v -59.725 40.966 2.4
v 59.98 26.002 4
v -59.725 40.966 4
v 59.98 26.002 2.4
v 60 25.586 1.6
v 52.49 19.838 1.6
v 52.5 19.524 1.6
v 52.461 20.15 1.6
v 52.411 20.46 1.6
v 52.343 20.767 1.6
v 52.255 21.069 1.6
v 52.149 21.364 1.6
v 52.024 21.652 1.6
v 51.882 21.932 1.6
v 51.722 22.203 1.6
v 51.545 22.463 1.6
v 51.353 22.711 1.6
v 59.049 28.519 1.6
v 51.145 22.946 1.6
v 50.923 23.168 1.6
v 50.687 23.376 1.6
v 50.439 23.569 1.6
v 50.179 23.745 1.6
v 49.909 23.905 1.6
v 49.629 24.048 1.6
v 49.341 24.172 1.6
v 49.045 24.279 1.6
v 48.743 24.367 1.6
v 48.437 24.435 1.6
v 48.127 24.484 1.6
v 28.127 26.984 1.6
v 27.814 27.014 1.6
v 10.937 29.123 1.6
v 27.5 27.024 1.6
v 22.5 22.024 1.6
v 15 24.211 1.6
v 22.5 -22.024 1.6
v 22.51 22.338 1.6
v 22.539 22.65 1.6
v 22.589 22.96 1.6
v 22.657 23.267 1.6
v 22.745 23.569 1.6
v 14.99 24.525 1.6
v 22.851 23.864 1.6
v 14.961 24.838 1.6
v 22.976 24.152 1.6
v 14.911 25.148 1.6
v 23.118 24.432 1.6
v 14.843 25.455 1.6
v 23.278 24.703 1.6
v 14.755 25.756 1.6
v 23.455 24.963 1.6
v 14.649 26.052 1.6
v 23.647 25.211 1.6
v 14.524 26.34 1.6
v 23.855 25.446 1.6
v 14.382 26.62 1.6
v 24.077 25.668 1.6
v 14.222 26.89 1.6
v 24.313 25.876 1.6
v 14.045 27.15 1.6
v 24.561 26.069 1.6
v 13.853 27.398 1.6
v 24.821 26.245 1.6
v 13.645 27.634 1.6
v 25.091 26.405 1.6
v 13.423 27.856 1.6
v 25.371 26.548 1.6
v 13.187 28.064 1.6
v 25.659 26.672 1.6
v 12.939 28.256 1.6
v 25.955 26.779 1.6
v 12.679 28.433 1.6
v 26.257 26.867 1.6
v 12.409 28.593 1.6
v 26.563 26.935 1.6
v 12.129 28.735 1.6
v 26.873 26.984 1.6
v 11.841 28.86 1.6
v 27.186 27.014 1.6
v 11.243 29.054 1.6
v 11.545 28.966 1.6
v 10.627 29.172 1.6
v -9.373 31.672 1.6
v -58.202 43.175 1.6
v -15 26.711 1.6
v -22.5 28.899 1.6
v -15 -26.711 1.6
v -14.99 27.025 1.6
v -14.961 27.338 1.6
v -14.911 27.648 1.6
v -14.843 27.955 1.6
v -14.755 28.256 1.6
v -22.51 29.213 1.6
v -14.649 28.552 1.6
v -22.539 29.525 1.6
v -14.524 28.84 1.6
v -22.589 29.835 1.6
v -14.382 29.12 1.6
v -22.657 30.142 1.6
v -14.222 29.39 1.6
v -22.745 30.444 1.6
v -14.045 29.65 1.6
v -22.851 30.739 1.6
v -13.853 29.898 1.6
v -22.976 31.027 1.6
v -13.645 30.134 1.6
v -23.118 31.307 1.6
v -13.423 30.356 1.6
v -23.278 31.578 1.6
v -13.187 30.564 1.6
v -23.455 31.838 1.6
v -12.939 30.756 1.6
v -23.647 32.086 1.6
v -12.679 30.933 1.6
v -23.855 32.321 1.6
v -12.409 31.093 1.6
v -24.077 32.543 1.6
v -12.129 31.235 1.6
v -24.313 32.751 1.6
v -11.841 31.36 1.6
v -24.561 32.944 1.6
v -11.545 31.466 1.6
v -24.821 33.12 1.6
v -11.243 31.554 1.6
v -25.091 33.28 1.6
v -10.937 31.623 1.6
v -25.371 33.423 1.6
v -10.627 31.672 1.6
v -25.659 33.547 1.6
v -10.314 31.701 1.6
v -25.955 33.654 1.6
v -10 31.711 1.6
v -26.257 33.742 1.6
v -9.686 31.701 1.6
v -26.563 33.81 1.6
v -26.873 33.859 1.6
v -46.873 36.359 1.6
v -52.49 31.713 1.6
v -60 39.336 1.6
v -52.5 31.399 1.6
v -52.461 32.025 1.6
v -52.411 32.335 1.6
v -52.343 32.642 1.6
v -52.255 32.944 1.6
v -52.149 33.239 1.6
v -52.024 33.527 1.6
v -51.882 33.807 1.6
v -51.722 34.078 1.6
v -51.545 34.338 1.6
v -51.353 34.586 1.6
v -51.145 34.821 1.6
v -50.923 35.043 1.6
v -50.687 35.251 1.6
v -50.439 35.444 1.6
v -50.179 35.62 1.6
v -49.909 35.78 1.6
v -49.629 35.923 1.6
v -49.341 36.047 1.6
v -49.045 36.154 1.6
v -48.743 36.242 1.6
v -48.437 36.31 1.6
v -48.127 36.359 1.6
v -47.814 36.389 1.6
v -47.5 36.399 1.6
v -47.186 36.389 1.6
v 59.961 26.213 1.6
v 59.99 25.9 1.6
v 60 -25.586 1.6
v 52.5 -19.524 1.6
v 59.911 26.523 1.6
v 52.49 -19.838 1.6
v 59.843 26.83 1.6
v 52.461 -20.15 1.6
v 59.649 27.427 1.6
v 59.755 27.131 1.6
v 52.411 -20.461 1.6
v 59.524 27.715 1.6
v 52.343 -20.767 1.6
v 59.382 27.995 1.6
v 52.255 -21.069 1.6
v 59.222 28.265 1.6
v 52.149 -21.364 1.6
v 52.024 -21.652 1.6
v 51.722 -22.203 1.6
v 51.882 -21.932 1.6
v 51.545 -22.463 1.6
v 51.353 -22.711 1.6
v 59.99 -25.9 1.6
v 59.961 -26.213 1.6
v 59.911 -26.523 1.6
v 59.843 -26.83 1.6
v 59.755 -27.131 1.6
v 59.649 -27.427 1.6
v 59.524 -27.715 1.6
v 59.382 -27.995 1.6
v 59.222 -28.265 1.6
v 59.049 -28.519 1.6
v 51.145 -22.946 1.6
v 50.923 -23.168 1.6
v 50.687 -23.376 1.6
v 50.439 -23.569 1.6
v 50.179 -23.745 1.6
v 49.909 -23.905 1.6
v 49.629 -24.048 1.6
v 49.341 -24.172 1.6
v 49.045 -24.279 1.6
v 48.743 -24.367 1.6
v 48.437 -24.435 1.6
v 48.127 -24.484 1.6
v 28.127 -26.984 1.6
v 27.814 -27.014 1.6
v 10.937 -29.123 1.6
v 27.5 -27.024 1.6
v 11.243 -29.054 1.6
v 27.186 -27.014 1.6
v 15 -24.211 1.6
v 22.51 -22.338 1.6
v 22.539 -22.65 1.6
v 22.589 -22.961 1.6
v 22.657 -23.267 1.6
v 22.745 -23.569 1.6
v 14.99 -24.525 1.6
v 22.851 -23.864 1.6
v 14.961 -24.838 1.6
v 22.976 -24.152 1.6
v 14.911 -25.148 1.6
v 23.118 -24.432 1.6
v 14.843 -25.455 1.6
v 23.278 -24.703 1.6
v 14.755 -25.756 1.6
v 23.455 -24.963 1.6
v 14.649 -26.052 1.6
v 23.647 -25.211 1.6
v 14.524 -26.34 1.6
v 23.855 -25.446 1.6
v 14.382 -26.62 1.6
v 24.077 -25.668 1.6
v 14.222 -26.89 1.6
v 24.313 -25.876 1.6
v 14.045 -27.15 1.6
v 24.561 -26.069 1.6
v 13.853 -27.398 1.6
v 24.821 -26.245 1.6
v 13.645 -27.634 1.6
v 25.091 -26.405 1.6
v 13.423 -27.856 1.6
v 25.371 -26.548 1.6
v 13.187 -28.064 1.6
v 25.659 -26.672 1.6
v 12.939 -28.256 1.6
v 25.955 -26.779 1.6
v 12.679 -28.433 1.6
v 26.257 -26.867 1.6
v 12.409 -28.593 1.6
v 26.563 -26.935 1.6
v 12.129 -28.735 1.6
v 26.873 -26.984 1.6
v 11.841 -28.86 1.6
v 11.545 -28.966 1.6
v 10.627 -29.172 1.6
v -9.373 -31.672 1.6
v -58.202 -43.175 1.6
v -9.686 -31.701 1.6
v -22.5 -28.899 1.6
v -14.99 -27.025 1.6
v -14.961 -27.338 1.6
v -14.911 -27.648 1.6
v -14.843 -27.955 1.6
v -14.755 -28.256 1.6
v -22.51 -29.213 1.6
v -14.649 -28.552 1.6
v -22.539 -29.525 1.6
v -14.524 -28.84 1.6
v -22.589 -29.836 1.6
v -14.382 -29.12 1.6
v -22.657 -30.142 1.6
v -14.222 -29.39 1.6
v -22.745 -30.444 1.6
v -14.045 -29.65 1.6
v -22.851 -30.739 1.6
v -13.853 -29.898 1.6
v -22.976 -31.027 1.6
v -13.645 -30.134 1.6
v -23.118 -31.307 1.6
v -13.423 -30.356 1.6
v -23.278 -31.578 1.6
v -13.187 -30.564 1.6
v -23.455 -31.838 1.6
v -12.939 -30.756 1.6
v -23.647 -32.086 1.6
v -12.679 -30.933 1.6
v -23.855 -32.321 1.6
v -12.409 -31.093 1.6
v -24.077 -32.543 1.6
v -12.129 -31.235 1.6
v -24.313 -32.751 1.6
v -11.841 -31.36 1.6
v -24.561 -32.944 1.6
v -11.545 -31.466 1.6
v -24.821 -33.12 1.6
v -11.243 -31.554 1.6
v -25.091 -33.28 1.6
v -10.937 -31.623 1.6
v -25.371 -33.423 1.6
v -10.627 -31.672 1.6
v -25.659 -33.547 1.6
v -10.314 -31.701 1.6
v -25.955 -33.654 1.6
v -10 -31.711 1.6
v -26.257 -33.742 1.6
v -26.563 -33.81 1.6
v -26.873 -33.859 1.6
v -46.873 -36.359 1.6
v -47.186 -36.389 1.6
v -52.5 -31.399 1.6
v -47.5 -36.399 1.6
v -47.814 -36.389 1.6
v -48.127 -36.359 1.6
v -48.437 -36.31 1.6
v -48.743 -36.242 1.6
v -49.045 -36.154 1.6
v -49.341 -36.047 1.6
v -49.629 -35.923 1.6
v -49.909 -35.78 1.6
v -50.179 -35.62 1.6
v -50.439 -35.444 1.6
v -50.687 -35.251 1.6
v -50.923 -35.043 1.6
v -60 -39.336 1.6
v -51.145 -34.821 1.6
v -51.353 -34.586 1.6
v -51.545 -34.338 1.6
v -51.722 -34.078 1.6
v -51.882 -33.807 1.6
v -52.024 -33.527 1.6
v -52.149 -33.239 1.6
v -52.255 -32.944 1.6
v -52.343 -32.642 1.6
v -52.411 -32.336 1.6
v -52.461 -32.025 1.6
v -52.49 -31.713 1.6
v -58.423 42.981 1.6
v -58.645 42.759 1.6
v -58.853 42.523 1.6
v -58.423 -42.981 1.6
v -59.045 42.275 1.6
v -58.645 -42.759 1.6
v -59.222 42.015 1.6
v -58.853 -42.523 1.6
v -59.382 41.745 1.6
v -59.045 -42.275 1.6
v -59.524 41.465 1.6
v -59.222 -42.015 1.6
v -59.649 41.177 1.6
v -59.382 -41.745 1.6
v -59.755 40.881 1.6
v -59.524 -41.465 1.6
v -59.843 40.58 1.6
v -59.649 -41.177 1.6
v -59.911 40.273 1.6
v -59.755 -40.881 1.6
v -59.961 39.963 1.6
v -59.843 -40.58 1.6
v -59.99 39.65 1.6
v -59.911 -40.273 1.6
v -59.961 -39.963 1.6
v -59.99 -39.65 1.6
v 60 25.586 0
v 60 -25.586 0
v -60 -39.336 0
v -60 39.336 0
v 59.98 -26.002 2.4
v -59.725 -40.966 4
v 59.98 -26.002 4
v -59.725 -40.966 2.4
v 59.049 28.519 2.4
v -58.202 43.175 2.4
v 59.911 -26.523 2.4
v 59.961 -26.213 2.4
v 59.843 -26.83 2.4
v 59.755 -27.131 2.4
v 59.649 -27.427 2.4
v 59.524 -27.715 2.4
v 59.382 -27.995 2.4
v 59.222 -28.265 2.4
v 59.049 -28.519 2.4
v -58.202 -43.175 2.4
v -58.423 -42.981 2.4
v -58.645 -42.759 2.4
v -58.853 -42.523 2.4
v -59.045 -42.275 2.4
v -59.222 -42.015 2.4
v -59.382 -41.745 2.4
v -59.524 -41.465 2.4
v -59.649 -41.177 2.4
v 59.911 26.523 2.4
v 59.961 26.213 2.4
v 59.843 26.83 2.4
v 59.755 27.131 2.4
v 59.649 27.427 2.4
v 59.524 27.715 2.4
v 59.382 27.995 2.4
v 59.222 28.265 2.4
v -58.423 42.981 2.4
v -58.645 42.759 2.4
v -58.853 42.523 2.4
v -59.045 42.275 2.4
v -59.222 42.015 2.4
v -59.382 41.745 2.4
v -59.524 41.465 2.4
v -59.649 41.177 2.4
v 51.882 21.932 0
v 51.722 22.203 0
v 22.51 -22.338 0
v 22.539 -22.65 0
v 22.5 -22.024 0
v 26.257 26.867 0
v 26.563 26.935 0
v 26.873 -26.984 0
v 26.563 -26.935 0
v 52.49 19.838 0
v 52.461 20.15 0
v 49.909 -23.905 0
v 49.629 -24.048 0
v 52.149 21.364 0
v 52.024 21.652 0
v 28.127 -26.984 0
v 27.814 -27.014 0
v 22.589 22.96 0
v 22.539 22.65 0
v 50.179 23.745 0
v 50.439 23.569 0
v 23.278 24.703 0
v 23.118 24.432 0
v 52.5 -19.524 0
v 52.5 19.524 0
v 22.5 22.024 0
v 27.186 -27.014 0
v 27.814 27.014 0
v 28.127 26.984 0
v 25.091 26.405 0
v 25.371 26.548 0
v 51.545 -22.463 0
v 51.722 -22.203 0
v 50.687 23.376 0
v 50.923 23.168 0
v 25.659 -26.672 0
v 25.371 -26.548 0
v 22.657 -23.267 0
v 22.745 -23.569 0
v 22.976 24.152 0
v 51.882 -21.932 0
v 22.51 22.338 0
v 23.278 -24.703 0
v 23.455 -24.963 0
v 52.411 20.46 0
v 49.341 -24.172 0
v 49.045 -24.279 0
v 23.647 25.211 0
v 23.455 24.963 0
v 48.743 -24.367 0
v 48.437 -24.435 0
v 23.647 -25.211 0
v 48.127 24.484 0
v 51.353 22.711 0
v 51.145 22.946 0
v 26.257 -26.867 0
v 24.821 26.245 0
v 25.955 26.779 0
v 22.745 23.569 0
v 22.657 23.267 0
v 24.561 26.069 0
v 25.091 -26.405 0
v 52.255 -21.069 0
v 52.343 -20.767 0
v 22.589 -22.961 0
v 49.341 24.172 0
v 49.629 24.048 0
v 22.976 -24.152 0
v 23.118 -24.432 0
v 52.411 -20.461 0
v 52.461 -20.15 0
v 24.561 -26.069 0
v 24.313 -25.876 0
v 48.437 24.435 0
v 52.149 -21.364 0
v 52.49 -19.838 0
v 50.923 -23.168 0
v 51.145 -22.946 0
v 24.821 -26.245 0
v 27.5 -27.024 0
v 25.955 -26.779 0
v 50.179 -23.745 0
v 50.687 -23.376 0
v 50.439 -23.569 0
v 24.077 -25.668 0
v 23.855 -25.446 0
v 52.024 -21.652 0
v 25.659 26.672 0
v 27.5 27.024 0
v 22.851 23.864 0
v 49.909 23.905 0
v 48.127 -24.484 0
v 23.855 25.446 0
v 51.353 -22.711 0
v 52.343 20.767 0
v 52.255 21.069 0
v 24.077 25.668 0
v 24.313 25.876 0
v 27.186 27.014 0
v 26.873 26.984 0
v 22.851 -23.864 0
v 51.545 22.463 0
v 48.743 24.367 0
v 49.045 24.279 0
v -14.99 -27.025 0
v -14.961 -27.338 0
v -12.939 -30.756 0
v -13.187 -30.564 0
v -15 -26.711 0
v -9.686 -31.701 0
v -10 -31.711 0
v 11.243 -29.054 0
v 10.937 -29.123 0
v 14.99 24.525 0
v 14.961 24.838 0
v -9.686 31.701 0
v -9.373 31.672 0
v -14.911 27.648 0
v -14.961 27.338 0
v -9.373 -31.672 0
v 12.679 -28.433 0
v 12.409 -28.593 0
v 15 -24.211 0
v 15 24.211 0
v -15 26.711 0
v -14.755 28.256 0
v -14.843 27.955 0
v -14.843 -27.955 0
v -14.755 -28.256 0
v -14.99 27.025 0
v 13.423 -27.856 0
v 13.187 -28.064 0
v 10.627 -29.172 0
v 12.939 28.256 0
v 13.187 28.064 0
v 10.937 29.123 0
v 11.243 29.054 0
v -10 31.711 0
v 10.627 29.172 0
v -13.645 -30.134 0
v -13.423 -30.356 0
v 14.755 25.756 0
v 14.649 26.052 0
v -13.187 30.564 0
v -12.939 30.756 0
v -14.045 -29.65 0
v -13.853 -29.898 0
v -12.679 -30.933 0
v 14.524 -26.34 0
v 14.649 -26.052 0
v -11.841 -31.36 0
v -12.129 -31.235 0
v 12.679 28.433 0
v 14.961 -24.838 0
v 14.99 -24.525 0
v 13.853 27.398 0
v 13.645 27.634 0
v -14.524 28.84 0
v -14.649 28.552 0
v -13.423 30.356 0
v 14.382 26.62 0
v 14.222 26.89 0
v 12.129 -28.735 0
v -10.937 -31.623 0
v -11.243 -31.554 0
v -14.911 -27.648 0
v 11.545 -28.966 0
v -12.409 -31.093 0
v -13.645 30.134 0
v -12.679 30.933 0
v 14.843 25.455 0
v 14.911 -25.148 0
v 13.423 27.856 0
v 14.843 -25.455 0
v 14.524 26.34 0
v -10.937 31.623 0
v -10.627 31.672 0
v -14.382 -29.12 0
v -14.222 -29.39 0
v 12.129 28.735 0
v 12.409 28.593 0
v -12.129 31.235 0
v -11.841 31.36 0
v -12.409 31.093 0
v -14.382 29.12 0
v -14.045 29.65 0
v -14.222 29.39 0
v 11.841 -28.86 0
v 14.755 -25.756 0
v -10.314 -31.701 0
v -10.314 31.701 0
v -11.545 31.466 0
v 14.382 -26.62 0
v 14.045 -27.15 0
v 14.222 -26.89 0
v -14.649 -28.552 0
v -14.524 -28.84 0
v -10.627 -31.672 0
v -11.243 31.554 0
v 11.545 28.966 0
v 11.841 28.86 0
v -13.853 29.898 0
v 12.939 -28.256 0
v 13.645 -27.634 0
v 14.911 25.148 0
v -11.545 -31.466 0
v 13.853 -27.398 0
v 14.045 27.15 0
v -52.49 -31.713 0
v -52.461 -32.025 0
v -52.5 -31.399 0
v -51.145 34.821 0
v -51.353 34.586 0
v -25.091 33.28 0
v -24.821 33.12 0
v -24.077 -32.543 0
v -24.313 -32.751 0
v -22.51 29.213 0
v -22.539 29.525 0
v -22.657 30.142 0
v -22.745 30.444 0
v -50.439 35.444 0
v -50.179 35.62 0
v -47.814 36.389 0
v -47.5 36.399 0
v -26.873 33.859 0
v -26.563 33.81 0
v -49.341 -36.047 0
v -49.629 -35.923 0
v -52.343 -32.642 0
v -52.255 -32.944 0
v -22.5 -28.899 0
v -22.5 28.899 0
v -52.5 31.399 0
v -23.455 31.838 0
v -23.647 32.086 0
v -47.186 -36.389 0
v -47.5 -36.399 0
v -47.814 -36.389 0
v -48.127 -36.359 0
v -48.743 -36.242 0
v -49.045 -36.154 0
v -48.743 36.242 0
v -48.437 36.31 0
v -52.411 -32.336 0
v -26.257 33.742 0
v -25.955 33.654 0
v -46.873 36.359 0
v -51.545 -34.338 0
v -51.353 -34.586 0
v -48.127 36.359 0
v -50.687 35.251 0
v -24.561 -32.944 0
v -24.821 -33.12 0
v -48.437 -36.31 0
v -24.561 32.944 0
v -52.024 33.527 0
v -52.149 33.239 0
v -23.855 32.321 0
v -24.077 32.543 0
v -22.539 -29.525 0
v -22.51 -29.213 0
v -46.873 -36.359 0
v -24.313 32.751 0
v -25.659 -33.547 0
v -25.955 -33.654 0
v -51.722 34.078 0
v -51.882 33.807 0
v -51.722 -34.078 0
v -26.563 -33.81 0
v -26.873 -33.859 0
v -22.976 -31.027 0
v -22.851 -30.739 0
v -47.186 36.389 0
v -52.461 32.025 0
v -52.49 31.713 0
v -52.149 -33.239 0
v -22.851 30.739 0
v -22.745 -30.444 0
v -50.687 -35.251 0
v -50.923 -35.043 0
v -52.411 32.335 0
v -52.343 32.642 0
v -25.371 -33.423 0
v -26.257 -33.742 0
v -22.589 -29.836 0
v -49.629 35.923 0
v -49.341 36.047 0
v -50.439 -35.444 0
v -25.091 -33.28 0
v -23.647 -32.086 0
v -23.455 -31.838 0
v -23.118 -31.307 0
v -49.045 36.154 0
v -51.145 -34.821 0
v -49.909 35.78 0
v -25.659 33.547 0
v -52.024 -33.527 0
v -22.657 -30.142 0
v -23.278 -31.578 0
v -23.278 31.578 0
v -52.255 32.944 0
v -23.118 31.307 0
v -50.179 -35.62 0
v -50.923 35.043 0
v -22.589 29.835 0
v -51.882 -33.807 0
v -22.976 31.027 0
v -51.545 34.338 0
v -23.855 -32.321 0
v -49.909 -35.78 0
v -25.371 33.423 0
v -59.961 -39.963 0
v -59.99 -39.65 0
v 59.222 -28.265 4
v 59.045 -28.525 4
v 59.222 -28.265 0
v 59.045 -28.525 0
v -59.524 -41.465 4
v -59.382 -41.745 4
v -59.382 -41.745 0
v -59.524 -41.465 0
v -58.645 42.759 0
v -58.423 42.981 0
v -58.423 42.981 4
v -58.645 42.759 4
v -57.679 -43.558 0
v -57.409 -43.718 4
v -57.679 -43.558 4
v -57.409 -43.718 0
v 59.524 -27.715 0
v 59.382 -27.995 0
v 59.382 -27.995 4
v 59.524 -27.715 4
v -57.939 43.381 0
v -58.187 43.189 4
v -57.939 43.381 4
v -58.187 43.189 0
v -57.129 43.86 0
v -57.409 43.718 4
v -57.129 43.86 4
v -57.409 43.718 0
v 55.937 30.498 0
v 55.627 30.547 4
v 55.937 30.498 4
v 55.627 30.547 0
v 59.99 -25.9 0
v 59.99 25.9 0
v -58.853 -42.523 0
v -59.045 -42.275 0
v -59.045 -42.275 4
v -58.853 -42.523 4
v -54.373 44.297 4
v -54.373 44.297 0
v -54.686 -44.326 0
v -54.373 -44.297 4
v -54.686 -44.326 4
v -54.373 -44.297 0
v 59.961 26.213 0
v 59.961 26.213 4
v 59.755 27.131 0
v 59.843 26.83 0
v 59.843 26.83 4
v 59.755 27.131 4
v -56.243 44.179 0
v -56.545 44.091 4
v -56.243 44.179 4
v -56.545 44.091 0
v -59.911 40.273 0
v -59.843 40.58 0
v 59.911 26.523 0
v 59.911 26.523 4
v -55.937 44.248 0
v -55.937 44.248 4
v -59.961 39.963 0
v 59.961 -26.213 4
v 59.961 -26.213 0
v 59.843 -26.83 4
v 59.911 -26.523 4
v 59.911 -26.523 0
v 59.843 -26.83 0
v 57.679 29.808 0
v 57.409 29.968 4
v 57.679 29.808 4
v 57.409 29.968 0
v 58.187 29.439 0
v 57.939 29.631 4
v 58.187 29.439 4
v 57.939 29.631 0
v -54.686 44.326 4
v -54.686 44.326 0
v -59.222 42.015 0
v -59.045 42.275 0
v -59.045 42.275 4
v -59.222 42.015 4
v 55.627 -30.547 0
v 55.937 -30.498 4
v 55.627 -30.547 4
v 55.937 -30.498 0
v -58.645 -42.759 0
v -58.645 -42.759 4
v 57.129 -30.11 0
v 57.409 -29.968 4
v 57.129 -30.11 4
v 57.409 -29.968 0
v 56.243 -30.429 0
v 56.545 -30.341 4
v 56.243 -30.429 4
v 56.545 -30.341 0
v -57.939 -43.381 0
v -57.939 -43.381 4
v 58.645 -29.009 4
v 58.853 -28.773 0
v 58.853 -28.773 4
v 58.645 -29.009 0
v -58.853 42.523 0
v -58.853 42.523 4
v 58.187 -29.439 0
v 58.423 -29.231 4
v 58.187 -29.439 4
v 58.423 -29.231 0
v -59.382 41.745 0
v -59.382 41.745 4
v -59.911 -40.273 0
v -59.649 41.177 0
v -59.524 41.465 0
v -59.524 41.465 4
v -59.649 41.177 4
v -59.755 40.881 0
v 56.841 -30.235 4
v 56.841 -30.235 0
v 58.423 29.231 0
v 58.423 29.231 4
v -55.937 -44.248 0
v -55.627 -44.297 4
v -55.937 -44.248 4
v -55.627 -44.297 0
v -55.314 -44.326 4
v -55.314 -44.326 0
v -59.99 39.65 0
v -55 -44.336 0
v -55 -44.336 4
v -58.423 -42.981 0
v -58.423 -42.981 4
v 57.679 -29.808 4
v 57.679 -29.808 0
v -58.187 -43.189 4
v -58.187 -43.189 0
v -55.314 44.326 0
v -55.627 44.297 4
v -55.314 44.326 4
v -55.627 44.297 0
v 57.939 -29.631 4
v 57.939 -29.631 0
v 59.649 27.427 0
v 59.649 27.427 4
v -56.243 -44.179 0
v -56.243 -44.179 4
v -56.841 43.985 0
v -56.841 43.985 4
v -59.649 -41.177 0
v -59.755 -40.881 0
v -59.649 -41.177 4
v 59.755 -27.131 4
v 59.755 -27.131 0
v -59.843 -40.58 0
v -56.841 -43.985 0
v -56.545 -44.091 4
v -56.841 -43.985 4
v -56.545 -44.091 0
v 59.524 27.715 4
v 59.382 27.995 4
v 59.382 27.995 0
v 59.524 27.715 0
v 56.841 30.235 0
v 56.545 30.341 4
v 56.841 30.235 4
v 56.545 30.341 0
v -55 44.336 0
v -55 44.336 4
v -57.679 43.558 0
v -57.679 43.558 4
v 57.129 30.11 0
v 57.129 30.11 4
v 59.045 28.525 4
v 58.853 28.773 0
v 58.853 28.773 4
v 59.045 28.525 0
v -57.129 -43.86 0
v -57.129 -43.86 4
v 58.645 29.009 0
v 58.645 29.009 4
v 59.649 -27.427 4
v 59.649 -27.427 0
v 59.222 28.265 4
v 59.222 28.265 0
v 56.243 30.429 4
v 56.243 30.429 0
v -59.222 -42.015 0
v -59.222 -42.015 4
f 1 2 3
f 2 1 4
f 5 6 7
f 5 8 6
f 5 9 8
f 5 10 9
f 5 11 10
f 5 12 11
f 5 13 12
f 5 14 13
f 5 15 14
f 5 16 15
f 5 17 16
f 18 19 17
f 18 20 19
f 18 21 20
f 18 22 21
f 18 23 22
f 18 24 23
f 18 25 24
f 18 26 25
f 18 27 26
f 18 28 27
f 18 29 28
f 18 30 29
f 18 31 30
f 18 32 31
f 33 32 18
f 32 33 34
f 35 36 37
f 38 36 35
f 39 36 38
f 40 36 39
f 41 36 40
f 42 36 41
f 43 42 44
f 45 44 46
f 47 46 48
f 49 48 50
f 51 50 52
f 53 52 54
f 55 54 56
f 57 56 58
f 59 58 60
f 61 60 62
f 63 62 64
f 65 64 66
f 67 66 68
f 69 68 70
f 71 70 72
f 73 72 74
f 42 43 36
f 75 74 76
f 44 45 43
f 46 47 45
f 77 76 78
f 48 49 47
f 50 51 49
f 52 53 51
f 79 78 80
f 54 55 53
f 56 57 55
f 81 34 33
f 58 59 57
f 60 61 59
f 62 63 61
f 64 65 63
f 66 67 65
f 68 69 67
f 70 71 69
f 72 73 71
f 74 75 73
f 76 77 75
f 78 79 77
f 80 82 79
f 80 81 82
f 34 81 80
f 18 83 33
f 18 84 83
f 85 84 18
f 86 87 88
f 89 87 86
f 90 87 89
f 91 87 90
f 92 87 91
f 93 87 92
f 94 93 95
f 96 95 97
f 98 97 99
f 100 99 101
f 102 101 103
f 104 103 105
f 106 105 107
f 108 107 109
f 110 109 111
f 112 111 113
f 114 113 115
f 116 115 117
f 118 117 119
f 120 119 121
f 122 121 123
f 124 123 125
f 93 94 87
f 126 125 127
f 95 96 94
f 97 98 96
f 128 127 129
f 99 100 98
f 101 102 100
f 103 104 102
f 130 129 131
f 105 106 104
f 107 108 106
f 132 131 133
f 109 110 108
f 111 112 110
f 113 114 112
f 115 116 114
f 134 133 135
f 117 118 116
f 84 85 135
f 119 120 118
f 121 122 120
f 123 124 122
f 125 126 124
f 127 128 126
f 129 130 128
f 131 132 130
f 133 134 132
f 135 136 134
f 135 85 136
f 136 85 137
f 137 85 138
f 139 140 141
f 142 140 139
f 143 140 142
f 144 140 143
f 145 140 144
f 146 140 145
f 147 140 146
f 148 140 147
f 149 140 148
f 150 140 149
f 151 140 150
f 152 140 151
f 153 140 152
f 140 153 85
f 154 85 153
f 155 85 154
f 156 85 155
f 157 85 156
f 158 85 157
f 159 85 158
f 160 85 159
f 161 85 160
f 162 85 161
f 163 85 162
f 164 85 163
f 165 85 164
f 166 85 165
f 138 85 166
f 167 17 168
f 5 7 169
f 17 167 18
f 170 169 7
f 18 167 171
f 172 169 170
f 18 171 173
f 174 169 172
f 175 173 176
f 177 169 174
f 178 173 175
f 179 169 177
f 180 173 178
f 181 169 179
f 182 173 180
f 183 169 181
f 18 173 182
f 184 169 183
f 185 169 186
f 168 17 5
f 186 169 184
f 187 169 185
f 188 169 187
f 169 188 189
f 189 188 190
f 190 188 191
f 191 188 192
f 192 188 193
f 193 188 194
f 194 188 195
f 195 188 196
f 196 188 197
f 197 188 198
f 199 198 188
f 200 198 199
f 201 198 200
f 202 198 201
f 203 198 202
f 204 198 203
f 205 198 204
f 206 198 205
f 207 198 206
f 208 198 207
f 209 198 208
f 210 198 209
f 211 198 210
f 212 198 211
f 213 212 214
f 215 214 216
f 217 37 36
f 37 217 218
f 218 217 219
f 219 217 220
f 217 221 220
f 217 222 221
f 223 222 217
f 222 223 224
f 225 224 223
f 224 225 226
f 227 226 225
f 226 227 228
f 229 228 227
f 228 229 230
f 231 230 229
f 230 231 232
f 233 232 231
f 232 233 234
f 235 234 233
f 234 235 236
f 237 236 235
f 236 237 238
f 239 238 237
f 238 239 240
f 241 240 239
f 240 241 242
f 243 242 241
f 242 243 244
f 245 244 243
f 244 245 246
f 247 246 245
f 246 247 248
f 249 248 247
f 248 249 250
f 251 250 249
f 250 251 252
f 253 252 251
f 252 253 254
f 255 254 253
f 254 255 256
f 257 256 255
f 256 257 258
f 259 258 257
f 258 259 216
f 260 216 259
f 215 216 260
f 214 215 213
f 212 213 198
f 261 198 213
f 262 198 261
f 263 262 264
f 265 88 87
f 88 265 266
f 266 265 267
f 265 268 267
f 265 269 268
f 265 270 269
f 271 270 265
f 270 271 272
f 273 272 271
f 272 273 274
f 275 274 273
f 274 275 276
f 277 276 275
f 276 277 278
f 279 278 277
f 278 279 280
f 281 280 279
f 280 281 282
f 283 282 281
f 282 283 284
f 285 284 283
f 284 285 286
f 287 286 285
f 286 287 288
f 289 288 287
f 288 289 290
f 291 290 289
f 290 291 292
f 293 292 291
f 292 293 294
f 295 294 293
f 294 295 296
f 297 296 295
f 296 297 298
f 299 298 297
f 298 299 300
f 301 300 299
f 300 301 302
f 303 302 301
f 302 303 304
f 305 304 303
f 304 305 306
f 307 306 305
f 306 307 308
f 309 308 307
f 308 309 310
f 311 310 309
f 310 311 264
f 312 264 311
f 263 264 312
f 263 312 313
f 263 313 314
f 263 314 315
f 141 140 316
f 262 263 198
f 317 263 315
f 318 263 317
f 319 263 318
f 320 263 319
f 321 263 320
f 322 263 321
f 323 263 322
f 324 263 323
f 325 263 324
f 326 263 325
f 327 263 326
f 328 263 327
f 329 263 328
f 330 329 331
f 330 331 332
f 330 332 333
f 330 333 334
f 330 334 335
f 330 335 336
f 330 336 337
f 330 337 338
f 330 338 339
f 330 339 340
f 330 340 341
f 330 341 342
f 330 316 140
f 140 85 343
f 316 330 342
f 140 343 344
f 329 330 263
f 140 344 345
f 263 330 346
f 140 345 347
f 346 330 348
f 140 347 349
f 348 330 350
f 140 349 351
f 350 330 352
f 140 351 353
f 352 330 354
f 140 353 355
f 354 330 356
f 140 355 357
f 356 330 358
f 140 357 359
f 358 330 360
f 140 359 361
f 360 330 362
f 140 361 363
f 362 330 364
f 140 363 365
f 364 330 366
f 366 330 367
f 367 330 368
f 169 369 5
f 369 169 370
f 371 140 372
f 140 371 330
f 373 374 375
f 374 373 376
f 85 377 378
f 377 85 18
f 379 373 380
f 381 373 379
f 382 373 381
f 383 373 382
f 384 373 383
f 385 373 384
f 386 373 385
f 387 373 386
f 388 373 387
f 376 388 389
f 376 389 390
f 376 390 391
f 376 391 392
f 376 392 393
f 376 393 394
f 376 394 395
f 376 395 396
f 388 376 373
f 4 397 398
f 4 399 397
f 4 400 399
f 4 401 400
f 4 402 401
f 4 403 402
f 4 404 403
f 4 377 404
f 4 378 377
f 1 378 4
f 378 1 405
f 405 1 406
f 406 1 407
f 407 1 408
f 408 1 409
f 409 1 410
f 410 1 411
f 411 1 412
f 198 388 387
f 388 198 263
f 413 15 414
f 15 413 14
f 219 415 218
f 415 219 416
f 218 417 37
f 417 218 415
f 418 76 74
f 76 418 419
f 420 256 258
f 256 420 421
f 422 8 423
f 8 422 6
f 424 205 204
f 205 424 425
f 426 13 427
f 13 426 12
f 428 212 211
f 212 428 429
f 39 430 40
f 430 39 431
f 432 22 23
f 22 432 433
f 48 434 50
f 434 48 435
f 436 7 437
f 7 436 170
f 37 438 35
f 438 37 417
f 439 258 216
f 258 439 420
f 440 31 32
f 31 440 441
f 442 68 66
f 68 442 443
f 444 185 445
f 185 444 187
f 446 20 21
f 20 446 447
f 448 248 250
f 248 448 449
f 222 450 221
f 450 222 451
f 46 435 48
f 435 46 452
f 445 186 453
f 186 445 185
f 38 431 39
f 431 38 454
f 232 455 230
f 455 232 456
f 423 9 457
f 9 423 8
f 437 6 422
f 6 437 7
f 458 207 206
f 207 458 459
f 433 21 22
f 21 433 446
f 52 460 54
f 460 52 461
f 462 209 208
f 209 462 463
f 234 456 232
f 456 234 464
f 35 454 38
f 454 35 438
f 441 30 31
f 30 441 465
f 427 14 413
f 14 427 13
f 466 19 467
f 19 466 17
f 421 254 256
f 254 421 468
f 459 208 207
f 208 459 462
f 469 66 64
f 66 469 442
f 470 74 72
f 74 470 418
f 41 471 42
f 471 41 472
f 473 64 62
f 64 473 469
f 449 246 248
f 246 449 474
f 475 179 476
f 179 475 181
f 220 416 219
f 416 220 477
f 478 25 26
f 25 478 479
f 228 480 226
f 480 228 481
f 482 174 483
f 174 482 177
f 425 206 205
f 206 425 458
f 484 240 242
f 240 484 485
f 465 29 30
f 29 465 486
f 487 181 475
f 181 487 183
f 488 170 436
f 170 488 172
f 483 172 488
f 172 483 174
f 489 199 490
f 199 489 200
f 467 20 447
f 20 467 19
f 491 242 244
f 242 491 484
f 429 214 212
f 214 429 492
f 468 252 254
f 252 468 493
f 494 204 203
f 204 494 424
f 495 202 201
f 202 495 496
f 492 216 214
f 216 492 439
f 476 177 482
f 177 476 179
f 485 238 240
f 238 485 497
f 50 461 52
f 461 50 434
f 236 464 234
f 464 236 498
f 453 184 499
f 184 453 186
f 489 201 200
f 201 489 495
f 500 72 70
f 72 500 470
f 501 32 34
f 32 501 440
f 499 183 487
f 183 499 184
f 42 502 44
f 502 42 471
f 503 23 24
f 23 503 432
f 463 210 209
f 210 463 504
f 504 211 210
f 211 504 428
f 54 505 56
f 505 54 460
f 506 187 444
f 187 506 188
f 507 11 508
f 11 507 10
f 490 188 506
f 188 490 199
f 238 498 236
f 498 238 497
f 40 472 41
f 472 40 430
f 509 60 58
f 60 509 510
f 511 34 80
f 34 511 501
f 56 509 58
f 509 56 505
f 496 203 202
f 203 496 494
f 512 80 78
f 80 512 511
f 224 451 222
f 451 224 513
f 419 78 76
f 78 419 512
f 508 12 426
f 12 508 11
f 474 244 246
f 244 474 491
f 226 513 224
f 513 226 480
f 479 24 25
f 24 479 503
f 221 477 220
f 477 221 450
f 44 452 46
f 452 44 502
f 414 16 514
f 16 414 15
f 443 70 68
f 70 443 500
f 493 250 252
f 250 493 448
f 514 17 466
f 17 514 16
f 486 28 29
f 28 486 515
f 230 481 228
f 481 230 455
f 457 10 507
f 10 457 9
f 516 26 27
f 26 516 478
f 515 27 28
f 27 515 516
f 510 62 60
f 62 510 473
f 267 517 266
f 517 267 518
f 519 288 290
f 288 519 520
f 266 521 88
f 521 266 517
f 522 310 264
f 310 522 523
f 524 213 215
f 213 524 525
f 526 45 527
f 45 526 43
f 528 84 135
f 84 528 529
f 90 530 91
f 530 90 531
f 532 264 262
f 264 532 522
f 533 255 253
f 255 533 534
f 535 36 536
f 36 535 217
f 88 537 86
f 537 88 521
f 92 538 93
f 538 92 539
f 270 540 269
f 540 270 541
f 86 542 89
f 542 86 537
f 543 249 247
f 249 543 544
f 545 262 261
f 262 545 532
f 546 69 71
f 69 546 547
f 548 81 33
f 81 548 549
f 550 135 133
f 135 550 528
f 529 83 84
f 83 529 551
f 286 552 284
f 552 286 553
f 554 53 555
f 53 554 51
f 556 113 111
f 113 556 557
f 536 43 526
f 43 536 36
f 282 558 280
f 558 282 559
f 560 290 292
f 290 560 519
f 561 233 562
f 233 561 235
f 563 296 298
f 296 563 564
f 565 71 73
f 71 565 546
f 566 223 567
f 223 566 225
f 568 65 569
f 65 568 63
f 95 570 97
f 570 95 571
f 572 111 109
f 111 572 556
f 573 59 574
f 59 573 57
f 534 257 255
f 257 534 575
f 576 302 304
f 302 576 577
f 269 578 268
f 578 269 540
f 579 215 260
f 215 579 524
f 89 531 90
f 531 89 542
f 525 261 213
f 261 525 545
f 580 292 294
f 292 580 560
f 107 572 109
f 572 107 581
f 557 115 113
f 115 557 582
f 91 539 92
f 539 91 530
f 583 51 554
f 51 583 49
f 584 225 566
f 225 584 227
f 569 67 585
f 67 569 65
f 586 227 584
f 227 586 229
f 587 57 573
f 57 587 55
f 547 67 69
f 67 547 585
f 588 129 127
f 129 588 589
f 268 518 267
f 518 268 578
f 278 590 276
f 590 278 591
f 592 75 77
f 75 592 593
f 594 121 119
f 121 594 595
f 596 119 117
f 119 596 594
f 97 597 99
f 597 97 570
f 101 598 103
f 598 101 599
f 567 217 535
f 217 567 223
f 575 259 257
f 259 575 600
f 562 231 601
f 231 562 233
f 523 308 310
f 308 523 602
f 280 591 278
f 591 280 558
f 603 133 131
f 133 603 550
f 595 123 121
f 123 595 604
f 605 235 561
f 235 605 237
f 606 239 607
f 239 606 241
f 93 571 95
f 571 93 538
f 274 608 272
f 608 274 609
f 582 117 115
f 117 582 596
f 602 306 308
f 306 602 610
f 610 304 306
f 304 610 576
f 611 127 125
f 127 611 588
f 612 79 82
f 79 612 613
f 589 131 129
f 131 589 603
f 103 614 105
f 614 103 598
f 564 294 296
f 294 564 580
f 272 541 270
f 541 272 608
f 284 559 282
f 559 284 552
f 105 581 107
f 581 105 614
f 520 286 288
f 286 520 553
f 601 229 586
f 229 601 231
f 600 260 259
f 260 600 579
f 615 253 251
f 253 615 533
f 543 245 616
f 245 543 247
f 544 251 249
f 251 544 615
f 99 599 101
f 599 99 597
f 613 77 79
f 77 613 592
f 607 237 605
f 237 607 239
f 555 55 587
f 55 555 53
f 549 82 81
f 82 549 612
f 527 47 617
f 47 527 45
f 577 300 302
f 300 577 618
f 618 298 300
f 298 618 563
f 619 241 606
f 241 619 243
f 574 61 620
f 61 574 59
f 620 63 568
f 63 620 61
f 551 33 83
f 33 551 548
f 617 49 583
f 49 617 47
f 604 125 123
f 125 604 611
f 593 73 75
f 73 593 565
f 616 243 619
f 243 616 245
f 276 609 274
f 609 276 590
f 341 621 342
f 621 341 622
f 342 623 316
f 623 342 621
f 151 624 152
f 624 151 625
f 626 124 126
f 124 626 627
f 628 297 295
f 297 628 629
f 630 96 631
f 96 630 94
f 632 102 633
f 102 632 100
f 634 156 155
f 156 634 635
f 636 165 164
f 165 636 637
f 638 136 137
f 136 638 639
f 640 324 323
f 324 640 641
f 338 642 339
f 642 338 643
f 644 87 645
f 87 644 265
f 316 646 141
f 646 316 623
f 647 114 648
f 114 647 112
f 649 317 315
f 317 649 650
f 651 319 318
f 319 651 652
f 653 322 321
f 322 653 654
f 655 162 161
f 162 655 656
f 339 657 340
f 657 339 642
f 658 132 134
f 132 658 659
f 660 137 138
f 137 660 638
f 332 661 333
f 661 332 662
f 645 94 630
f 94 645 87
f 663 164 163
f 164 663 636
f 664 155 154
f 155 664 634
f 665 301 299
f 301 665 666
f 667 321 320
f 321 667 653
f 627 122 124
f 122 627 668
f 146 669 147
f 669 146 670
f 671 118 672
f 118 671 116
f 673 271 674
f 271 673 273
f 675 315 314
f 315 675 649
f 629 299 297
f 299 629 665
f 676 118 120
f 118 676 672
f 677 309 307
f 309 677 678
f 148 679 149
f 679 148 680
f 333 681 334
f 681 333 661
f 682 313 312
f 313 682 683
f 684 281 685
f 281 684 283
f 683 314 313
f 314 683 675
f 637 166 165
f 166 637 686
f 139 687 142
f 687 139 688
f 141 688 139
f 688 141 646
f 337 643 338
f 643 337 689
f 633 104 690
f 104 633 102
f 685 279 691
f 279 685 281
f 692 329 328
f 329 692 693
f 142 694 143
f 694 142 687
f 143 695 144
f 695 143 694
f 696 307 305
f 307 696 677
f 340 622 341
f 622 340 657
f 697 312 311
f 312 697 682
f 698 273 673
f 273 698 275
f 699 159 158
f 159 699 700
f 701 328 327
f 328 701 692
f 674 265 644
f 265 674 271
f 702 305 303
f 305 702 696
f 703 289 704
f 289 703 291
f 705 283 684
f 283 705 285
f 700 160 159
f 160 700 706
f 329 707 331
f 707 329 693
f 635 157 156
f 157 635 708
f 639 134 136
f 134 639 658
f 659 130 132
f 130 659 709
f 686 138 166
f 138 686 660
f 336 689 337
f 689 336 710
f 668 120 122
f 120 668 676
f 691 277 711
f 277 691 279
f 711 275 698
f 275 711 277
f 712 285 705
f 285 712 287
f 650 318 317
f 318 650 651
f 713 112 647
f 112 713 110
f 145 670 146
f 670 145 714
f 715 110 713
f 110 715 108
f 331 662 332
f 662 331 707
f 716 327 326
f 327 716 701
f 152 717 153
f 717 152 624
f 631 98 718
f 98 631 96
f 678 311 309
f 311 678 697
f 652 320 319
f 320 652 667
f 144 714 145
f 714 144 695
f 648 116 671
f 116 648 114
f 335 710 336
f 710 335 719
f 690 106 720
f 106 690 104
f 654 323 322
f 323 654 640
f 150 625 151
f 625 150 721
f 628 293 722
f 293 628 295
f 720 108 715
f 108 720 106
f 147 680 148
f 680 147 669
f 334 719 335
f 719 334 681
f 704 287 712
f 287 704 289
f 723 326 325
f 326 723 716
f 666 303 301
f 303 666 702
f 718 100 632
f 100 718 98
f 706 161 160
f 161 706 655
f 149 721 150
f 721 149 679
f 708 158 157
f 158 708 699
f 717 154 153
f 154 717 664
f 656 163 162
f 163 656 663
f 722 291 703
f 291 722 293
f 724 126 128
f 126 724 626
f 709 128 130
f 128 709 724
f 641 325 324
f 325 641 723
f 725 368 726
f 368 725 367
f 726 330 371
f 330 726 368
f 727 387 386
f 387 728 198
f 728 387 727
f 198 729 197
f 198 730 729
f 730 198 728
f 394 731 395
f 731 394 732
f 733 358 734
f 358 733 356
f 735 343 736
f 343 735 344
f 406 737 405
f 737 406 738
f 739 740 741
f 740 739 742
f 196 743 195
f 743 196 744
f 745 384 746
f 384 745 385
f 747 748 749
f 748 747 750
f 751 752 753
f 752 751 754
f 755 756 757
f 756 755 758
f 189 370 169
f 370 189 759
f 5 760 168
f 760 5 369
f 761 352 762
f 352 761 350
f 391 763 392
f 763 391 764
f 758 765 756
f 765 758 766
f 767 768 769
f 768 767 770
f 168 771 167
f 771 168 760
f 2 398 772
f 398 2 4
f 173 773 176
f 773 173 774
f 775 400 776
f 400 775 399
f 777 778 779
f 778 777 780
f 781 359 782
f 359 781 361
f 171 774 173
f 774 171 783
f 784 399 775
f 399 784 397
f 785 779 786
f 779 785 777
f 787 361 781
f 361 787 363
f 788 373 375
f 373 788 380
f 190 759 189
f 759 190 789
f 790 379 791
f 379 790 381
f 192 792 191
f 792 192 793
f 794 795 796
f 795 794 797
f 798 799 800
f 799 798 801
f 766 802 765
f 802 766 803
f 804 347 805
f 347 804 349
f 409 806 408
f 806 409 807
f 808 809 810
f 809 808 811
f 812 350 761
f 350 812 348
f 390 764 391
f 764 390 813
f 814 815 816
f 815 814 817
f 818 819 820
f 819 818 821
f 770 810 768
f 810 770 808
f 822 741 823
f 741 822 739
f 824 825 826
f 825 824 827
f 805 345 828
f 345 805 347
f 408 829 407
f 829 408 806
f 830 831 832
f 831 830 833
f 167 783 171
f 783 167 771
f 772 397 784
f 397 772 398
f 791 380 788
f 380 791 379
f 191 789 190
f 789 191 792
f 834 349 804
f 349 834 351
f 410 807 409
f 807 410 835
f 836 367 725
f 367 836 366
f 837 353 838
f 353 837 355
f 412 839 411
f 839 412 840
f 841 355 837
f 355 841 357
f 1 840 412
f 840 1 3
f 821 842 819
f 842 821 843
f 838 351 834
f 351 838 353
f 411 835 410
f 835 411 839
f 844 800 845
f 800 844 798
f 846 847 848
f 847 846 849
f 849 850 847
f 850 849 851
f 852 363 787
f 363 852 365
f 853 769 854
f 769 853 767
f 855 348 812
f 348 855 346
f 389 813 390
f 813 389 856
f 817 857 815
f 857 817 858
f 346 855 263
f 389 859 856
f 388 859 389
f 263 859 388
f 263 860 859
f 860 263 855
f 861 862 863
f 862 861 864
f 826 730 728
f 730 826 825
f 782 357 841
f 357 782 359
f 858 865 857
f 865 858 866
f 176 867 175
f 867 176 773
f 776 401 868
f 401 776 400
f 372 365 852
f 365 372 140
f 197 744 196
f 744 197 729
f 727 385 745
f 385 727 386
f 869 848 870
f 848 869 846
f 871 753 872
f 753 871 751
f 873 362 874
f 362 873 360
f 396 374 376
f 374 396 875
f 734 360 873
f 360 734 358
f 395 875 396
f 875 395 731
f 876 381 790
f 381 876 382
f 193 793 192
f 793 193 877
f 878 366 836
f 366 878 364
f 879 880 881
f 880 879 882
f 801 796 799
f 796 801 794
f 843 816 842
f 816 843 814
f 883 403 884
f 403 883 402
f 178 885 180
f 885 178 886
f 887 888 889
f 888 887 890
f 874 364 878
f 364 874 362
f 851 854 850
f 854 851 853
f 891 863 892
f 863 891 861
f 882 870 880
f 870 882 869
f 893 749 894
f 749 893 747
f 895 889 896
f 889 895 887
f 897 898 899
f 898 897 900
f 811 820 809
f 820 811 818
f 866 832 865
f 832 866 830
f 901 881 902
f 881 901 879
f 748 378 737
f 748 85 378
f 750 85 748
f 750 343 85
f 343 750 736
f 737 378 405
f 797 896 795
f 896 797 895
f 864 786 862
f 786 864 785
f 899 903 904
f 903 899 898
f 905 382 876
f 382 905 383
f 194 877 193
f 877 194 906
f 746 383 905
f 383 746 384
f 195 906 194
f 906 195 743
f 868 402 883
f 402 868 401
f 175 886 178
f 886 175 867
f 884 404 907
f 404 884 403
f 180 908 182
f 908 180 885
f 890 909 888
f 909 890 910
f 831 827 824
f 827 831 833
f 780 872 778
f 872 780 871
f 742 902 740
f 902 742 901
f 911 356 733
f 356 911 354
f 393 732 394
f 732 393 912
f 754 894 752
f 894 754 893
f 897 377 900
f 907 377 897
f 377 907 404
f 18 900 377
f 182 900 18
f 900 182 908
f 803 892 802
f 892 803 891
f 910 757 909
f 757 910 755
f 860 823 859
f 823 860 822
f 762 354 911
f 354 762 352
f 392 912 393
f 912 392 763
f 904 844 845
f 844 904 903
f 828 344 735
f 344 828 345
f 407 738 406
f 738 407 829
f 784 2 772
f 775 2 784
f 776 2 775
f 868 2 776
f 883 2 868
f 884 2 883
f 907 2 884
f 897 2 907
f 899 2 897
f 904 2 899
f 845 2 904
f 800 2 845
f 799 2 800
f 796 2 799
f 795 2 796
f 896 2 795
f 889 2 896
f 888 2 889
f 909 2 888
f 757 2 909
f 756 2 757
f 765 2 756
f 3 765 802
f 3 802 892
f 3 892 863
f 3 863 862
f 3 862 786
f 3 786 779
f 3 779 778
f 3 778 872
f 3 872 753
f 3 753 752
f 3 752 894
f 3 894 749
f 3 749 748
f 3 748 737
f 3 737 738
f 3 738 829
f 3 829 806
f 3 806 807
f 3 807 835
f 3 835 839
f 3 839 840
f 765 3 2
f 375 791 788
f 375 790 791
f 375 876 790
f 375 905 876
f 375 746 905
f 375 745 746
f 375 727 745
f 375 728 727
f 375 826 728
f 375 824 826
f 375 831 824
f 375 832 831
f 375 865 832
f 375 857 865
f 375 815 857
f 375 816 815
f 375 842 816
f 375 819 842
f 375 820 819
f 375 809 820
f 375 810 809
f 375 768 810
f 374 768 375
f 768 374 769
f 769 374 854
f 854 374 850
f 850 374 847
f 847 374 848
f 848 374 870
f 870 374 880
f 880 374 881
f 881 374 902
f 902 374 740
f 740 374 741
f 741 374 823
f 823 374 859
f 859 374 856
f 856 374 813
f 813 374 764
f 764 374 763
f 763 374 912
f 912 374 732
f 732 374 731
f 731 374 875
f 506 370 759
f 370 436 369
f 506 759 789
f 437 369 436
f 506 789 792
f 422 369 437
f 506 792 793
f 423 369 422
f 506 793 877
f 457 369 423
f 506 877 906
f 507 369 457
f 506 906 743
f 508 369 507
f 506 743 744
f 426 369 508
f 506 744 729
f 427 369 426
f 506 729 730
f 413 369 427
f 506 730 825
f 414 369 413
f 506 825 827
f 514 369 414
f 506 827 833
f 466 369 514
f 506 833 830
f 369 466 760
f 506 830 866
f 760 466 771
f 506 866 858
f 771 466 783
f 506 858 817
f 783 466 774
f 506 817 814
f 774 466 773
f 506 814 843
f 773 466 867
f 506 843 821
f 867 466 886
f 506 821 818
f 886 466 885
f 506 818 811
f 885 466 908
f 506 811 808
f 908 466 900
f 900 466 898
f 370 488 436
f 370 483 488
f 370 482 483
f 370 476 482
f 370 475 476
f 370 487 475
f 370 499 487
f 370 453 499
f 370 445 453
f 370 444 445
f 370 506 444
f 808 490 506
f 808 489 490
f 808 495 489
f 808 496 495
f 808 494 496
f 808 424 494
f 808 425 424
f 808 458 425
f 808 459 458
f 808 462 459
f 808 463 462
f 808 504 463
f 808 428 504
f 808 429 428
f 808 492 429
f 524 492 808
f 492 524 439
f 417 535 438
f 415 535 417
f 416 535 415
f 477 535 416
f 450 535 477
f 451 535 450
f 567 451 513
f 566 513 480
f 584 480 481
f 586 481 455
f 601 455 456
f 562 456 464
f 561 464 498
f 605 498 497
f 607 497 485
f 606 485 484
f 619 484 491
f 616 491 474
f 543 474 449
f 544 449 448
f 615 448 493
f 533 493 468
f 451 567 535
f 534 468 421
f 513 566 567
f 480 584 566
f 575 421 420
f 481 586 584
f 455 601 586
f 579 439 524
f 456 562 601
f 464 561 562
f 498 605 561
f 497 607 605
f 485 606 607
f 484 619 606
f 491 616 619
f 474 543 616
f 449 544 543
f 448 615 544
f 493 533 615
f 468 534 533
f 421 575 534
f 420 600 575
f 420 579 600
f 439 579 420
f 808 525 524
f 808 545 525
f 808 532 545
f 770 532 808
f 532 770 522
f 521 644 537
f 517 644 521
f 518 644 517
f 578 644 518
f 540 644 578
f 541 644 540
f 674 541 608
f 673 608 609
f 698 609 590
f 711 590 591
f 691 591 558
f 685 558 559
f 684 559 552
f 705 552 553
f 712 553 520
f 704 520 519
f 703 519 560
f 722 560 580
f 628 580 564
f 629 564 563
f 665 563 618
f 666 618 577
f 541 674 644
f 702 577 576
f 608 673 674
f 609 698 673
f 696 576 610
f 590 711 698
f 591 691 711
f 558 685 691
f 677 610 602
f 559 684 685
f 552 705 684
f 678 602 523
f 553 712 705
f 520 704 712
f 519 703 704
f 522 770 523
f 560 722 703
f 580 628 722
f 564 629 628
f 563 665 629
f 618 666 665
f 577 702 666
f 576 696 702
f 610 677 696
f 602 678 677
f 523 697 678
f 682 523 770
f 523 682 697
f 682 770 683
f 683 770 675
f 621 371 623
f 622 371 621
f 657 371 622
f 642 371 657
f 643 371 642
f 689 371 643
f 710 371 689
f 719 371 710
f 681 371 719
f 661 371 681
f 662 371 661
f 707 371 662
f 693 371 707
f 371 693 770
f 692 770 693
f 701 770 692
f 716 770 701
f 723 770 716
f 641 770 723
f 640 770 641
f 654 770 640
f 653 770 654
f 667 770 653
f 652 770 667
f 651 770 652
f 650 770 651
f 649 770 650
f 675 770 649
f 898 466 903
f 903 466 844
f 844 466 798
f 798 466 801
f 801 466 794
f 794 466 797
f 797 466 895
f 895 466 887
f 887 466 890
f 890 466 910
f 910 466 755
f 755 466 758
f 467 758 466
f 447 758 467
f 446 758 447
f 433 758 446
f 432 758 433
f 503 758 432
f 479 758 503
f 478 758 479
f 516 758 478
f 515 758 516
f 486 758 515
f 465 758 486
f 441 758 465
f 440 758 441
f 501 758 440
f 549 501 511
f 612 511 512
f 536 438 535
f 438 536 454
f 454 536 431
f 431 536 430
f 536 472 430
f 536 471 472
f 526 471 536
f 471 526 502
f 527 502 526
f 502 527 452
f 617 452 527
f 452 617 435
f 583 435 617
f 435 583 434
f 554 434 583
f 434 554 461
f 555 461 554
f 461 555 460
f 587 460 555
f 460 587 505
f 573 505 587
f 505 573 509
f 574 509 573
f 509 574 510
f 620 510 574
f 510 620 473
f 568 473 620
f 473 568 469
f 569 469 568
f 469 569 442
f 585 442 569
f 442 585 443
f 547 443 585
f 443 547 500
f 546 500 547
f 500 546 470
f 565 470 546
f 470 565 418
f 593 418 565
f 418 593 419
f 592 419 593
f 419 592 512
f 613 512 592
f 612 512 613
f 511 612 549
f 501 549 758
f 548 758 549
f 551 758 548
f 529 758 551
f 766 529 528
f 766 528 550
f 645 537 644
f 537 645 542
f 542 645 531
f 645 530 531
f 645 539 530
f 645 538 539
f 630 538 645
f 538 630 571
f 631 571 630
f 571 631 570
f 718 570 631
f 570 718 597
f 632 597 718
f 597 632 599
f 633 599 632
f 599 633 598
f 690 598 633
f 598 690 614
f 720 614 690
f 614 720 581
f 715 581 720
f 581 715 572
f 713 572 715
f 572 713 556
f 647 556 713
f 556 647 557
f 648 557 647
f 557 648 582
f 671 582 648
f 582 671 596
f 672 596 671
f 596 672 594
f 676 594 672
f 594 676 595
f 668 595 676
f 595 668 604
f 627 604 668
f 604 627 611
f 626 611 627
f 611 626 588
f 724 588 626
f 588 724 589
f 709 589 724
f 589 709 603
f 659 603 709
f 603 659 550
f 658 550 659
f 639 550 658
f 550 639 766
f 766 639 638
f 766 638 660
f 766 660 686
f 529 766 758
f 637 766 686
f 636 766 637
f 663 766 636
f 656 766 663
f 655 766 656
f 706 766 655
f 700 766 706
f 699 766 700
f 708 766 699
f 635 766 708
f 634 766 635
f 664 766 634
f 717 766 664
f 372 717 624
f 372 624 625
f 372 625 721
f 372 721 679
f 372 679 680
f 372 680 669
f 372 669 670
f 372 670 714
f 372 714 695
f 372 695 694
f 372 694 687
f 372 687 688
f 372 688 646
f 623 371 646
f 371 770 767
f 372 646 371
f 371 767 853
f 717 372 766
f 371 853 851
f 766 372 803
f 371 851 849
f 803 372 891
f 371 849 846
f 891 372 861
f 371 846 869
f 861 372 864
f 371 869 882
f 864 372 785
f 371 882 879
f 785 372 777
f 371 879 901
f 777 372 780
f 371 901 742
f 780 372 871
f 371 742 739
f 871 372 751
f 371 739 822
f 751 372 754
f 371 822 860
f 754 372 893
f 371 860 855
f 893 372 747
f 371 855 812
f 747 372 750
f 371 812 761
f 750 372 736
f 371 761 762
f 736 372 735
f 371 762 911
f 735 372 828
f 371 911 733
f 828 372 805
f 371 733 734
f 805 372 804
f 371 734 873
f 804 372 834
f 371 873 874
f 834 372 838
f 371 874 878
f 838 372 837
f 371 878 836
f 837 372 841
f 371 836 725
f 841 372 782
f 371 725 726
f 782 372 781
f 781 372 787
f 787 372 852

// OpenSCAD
/*
 * Lid for a typical hard cheese container from the supermarket
 *
 * Copyright (C) 2022  Matthias Gazzari
 *
 * This program is free software: you can redistribute it and/or modify
 * it under the terms of the GNU General Public License as published by
 * the Free Software Foundation, either version 3 of the License, or
 * (at your option) any later version.
 *
 * This program is distributed in the hope that it will be useful,
 * but WITHOUT ANY WARRANTY; without even the implied warranty of
 * MERCHANTABILITY or FITNESS FOR A PARTICULAR PURPOSE.  See the
 * GNU General Public License for more details.
 *
 * You should have received a copy of the GNU General Public License
 * along with this program.  If not, see <https://www.gnu.org/licenses/>.
*/

module simple_trapezoid(w1, w2, h, center=true) {
    translate(center ? [-h/2, -w1/2] : [0, 0])
    polygon([
        [0, 0],
        [h, (w1-w2) / 2],
        [h, w2 + (w1-w2) / 2],
        [0, w1],
    ]);
}

module trapezoid_round_edges(w1, w2, h, r=5, center=true) {
    // ensure that the circles can fit inside the trapezoid
    assert (r <= h/2);
    
    // standard trapezoid edge positions
    trapezoid_positions = [
        [0, 0],
        [h - 0, (w1-w2) / 2],
        [h - 0, w2 + (w1-w2) / 2],
        [0, w1],
    ];

    // determine both inner angles alpha and beta of a trapezoid
    w = abs(w1-w2) / 2;
    alpha = (w1 > w2) ? atan(h / w) : 180 - atan(h / w);
    beta = (w1 > w2) ? 180 - atan(h / w) : atan(h / w);

    // offset applied to the standard trapezoid positions to account
    // for the circles radii
    rounded_corner_offset = [
        [r,   r / tan(alpha/2)],
        [-r,  r / tan(beta/2)],
        [-r, -r / tan(beta/2)],
        [r,  -r / tan(alpha/2)],
    ];

    // create the actual trapezoid
    translate(center ? [-h/2, -w1/2] : [0, 0])
    hull() {
        for (pos=trapezoid_positions + rounded_corner_offset) {
            translate(pos) circle(r = r);
        }
    }
}

// measure the container and derive the main trapezoid parameters (w1, w2, h) for the lid
lid_w1 = 90;
lid_w2 = 60;
lid_h = 120;

// manually determine the following parameters to create the final shape of the lid
$fn = 100;
groove_h = 0.8;
rim_w = 14;
thick = 1.6;
overhang = thick + 6.4;

// create the lid
difference() {
    linear_extrude(2 * thick + groove_h)
    trapezoid_round_edges(lid_w1, lid_w2, lid_h);
    // remove from upper part
    translate([0, 0, thick]) {
        // remove the main part of the lid
        linear_extrude(2*thick + groove_h)
        simple_trapezoid(lid_w1 - overhang, lid_w2 - overhang, lid_h);
        // remove space for the groove
        linear_extrude(groove_h)
        simple_trapezoid(lid_w1-2*thick, lid_w2-2*thick, lid_h);
    }
    // create three evenly distanced holes to save material
    for (i = [0:2]){
        let (
            slope = (lid_w1 - lid_w2) / lid_h,
            quarter_lid_h = lid_h / 4,
            width = lid_w2 + slope * (i * quarter_lid_h + (i + 1) * quarter_lid_h/4) - rim_w,
            x_offset = (1 - i) * (quarter_lid_h + quarter_lid_h/4)
        ) {
            translate([x_offset, 0, -thick])
            linear_extrude(4 * thick + groove_h)
            trapezoid_round_edges(slope * quarter_lid_h + width, width, quarter_lid_h);
        }
    }
}
